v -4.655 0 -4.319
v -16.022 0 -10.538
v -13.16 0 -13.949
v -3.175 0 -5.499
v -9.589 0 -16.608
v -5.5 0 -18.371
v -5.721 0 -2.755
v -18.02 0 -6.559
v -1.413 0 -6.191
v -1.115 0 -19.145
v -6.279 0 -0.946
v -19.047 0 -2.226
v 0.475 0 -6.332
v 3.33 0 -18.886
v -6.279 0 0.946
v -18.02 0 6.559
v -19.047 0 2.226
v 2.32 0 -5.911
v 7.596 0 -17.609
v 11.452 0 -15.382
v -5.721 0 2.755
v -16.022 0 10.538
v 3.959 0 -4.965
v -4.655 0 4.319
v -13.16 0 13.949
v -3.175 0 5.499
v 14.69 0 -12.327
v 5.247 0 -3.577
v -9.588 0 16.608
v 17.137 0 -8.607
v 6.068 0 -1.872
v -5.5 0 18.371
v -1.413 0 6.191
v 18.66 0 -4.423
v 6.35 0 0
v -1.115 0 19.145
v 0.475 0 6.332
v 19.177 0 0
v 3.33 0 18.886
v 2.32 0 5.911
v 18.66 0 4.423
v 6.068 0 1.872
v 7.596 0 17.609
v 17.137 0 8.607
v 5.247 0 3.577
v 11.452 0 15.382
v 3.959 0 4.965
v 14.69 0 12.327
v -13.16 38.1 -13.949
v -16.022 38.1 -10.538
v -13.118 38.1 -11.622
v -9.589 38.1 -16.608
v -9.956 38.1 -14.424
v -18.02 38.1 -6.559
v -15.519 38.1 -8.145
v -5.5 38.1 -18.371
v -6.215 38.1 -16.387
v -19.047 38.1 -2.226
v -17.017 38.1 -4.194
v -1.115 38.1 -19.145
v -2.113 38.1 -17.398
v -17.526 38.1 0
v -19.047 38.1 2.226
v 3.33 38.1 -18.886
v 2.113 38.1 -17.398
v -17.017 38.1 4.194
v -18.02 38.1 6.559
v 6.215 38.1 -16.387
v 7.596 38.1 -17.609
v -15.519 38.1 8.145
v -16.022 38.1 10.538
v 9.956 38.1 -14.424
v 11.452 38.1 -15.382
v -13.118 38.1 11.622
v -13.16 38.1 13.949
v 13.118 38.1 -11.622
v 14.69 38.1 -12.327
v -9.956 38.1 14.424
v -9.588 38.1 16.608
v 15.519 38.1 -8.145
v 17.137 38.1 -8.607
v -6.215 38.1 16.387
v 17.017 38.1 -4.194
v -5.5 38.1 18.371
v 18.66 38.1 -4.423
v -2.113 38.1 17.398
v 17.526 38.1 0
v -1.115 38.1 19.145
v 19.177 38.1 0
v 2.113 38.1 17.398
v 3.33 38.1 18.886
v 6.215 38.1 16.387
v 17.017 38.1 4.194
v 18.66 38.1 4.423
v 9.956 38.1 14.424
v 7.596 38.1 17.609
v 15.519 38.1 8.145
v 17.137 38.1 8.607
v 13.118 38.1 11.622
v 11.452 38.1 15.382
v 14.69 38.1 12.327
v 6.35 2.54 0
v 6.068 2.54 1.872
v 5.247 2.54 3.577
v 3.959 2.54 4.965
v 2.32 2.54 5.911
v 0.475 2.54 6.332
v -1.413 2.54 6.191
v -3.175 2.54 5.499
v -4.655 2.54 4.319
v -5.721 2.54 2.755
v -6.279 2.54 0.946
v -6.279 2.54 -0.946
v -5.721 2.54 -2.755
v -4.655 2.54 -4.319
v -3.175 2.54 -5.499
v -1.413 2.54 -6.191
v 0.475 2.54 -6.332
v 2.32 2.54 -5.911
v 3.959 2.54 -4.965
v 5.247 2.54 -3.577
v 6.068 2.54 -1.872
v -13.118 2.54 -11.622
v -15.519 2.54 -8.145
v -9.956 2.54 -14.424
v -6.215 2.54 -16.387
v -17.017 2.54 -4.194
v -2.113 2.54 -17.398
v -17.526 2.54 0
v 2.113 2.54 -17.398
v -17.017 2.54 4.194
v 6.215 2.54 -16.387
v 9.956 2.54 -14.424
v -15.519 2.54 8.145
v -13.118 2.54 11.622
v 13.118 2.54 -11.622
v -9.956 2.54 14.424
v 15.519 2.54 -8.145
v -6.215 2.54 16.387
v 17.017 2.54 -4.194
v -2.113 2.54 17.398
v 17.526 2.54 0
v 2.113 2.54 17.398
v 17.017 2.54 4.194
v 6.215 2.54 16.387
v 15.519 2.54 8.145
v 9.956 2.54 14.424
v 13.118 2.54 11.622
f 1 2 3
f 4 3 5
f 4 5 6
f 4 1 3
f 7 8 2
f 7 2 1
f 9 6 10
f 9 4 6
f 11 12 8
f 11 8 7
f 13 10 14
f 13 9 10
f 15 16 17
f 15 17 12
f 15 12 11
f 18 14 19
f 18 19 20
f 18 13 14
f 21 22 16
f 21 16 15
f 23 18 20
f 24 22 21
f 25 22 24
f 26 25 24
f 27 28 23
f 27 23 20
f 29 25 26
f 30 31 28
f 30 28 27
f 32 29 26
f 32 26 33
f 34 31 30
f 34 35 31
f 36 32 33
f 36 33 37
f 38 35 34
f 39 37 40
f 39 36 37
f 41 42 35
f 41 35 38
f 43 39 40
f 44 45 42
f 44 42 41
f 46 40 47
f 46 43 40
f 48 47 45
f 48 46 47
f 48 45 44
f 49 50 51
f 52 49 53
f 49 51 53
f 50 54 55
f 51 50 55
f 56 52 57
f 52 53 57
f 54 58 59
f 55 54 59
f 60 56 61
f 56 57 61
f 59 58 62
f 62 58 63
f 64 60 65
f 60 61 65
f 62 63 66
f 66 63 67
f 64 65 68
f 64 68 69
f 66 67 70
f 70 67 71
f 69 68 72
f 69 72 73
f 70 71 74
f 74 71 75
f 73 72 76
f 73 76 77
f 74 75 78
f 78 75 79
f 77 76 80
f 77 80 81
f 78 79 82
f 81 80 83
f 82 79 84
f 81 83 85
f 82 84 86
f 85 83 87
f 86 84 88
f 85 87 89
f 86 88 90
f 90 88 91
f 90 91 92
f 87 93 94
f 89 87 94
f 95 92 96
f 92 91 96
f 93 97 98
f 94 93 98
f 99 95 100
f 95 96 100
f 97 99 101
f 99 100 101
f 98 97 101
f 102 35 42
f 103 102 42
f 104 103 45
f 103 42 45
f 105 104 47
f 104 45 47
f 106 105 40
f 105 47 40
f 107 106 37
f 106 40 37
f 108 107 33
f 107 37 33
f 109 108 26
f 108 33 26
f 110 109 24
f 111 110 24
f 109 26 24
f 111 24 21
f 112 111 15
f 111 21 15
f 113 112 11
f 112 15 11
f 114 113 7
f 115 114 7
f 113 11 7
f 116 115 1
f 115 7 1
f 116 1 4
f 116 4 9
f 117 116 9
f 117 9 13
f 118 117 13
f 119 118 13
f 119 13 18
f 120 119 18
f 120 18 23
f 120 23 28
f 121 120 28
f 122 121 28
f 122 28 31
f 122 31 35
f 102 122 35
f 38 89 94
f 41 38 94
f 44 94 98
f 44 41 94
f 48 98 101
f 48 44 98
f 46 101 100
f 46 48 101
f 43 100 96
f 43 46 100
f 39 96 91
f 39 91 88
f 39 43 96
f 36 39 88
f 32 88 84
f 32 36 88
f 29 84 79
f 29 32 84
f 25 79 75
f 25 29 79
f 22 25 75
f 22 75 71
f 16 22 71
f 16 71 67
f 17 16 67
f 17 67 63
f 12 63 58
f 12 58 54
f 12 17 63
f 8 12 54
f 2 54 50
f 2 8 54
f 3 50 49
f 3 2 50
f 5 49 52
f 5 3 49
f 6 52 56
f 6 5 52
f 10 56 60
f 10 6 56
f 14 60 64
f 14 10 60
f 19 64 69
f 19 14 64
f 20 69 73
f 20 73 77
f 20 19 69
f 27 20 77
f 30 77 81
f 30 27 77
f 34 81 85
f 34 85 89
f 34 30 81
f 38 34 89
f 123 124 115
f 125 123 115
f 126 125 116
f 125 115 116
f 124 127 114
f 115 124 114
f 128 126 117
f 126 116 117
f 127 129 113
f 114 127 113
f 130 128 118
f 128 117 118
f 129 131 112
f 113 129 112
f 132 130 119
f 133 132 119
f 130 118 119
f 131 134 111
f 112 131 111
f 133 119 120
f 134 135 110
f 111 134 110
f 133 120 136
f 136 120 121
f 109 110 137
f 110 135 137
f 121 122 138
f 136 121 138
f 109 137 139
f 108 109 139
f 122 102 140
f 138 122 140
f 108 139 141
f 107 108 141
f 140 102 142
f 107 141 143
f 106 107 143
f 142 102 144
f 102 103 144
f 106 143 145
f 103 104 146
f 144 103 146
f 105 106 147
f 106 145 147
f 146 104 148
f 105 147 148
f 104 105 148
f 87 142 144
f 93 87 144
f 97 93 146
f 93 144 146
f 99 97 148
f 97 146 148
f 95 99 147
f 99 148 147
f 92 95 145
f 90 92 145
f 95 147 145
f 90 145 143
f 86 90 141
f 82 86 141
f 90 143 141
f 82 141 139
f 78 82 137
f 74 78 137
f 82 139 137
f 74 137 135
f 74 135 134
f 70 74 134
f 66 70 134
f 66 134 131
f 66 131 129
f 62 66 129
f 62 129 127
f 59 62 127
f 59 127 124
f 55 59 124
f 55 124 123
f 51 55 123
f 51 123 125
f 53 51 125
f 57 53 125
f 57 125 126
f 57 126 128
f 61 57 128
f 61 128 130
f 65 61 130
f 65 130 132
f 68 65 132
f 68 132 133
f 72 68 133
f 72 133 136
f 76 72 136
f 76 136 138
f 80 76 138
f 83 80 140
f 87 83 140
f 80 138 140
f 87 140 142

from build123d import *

# Parameters (mm, degrees)
F0_R     = 19.177
F0_R_2   = 17.526
F1_DEPTH = 38.1
F2_R     = 17.526
F3_DEPTH = 2.54
F4_R     = 6.35
F5_DEPTH = 25.4


with BuildPart() as f1:
    # F0 (on Front) → F1 (new body)
    with BuildSketch(Plane.XZ):
        Circle(F0_R)
        Circle(F0_R_2, mode=Mode.SUBTRACT)
    extrude(amount=-F1_DEPTH)

    # F2 (on Front) → F3 (join)
    with BuildSketch(Plane.XZ):
        Circle(F2_R)
    extrude(amount=-F3_DEPTH)

    # F4 (on face) → F5 (cut)
    with BuildSketch(Plane.XZ):
        Circle(F4_R)
    extrude(amount=-F5_DEPTH, mode=Mode.SUBTRACT)


solid = f1.part
